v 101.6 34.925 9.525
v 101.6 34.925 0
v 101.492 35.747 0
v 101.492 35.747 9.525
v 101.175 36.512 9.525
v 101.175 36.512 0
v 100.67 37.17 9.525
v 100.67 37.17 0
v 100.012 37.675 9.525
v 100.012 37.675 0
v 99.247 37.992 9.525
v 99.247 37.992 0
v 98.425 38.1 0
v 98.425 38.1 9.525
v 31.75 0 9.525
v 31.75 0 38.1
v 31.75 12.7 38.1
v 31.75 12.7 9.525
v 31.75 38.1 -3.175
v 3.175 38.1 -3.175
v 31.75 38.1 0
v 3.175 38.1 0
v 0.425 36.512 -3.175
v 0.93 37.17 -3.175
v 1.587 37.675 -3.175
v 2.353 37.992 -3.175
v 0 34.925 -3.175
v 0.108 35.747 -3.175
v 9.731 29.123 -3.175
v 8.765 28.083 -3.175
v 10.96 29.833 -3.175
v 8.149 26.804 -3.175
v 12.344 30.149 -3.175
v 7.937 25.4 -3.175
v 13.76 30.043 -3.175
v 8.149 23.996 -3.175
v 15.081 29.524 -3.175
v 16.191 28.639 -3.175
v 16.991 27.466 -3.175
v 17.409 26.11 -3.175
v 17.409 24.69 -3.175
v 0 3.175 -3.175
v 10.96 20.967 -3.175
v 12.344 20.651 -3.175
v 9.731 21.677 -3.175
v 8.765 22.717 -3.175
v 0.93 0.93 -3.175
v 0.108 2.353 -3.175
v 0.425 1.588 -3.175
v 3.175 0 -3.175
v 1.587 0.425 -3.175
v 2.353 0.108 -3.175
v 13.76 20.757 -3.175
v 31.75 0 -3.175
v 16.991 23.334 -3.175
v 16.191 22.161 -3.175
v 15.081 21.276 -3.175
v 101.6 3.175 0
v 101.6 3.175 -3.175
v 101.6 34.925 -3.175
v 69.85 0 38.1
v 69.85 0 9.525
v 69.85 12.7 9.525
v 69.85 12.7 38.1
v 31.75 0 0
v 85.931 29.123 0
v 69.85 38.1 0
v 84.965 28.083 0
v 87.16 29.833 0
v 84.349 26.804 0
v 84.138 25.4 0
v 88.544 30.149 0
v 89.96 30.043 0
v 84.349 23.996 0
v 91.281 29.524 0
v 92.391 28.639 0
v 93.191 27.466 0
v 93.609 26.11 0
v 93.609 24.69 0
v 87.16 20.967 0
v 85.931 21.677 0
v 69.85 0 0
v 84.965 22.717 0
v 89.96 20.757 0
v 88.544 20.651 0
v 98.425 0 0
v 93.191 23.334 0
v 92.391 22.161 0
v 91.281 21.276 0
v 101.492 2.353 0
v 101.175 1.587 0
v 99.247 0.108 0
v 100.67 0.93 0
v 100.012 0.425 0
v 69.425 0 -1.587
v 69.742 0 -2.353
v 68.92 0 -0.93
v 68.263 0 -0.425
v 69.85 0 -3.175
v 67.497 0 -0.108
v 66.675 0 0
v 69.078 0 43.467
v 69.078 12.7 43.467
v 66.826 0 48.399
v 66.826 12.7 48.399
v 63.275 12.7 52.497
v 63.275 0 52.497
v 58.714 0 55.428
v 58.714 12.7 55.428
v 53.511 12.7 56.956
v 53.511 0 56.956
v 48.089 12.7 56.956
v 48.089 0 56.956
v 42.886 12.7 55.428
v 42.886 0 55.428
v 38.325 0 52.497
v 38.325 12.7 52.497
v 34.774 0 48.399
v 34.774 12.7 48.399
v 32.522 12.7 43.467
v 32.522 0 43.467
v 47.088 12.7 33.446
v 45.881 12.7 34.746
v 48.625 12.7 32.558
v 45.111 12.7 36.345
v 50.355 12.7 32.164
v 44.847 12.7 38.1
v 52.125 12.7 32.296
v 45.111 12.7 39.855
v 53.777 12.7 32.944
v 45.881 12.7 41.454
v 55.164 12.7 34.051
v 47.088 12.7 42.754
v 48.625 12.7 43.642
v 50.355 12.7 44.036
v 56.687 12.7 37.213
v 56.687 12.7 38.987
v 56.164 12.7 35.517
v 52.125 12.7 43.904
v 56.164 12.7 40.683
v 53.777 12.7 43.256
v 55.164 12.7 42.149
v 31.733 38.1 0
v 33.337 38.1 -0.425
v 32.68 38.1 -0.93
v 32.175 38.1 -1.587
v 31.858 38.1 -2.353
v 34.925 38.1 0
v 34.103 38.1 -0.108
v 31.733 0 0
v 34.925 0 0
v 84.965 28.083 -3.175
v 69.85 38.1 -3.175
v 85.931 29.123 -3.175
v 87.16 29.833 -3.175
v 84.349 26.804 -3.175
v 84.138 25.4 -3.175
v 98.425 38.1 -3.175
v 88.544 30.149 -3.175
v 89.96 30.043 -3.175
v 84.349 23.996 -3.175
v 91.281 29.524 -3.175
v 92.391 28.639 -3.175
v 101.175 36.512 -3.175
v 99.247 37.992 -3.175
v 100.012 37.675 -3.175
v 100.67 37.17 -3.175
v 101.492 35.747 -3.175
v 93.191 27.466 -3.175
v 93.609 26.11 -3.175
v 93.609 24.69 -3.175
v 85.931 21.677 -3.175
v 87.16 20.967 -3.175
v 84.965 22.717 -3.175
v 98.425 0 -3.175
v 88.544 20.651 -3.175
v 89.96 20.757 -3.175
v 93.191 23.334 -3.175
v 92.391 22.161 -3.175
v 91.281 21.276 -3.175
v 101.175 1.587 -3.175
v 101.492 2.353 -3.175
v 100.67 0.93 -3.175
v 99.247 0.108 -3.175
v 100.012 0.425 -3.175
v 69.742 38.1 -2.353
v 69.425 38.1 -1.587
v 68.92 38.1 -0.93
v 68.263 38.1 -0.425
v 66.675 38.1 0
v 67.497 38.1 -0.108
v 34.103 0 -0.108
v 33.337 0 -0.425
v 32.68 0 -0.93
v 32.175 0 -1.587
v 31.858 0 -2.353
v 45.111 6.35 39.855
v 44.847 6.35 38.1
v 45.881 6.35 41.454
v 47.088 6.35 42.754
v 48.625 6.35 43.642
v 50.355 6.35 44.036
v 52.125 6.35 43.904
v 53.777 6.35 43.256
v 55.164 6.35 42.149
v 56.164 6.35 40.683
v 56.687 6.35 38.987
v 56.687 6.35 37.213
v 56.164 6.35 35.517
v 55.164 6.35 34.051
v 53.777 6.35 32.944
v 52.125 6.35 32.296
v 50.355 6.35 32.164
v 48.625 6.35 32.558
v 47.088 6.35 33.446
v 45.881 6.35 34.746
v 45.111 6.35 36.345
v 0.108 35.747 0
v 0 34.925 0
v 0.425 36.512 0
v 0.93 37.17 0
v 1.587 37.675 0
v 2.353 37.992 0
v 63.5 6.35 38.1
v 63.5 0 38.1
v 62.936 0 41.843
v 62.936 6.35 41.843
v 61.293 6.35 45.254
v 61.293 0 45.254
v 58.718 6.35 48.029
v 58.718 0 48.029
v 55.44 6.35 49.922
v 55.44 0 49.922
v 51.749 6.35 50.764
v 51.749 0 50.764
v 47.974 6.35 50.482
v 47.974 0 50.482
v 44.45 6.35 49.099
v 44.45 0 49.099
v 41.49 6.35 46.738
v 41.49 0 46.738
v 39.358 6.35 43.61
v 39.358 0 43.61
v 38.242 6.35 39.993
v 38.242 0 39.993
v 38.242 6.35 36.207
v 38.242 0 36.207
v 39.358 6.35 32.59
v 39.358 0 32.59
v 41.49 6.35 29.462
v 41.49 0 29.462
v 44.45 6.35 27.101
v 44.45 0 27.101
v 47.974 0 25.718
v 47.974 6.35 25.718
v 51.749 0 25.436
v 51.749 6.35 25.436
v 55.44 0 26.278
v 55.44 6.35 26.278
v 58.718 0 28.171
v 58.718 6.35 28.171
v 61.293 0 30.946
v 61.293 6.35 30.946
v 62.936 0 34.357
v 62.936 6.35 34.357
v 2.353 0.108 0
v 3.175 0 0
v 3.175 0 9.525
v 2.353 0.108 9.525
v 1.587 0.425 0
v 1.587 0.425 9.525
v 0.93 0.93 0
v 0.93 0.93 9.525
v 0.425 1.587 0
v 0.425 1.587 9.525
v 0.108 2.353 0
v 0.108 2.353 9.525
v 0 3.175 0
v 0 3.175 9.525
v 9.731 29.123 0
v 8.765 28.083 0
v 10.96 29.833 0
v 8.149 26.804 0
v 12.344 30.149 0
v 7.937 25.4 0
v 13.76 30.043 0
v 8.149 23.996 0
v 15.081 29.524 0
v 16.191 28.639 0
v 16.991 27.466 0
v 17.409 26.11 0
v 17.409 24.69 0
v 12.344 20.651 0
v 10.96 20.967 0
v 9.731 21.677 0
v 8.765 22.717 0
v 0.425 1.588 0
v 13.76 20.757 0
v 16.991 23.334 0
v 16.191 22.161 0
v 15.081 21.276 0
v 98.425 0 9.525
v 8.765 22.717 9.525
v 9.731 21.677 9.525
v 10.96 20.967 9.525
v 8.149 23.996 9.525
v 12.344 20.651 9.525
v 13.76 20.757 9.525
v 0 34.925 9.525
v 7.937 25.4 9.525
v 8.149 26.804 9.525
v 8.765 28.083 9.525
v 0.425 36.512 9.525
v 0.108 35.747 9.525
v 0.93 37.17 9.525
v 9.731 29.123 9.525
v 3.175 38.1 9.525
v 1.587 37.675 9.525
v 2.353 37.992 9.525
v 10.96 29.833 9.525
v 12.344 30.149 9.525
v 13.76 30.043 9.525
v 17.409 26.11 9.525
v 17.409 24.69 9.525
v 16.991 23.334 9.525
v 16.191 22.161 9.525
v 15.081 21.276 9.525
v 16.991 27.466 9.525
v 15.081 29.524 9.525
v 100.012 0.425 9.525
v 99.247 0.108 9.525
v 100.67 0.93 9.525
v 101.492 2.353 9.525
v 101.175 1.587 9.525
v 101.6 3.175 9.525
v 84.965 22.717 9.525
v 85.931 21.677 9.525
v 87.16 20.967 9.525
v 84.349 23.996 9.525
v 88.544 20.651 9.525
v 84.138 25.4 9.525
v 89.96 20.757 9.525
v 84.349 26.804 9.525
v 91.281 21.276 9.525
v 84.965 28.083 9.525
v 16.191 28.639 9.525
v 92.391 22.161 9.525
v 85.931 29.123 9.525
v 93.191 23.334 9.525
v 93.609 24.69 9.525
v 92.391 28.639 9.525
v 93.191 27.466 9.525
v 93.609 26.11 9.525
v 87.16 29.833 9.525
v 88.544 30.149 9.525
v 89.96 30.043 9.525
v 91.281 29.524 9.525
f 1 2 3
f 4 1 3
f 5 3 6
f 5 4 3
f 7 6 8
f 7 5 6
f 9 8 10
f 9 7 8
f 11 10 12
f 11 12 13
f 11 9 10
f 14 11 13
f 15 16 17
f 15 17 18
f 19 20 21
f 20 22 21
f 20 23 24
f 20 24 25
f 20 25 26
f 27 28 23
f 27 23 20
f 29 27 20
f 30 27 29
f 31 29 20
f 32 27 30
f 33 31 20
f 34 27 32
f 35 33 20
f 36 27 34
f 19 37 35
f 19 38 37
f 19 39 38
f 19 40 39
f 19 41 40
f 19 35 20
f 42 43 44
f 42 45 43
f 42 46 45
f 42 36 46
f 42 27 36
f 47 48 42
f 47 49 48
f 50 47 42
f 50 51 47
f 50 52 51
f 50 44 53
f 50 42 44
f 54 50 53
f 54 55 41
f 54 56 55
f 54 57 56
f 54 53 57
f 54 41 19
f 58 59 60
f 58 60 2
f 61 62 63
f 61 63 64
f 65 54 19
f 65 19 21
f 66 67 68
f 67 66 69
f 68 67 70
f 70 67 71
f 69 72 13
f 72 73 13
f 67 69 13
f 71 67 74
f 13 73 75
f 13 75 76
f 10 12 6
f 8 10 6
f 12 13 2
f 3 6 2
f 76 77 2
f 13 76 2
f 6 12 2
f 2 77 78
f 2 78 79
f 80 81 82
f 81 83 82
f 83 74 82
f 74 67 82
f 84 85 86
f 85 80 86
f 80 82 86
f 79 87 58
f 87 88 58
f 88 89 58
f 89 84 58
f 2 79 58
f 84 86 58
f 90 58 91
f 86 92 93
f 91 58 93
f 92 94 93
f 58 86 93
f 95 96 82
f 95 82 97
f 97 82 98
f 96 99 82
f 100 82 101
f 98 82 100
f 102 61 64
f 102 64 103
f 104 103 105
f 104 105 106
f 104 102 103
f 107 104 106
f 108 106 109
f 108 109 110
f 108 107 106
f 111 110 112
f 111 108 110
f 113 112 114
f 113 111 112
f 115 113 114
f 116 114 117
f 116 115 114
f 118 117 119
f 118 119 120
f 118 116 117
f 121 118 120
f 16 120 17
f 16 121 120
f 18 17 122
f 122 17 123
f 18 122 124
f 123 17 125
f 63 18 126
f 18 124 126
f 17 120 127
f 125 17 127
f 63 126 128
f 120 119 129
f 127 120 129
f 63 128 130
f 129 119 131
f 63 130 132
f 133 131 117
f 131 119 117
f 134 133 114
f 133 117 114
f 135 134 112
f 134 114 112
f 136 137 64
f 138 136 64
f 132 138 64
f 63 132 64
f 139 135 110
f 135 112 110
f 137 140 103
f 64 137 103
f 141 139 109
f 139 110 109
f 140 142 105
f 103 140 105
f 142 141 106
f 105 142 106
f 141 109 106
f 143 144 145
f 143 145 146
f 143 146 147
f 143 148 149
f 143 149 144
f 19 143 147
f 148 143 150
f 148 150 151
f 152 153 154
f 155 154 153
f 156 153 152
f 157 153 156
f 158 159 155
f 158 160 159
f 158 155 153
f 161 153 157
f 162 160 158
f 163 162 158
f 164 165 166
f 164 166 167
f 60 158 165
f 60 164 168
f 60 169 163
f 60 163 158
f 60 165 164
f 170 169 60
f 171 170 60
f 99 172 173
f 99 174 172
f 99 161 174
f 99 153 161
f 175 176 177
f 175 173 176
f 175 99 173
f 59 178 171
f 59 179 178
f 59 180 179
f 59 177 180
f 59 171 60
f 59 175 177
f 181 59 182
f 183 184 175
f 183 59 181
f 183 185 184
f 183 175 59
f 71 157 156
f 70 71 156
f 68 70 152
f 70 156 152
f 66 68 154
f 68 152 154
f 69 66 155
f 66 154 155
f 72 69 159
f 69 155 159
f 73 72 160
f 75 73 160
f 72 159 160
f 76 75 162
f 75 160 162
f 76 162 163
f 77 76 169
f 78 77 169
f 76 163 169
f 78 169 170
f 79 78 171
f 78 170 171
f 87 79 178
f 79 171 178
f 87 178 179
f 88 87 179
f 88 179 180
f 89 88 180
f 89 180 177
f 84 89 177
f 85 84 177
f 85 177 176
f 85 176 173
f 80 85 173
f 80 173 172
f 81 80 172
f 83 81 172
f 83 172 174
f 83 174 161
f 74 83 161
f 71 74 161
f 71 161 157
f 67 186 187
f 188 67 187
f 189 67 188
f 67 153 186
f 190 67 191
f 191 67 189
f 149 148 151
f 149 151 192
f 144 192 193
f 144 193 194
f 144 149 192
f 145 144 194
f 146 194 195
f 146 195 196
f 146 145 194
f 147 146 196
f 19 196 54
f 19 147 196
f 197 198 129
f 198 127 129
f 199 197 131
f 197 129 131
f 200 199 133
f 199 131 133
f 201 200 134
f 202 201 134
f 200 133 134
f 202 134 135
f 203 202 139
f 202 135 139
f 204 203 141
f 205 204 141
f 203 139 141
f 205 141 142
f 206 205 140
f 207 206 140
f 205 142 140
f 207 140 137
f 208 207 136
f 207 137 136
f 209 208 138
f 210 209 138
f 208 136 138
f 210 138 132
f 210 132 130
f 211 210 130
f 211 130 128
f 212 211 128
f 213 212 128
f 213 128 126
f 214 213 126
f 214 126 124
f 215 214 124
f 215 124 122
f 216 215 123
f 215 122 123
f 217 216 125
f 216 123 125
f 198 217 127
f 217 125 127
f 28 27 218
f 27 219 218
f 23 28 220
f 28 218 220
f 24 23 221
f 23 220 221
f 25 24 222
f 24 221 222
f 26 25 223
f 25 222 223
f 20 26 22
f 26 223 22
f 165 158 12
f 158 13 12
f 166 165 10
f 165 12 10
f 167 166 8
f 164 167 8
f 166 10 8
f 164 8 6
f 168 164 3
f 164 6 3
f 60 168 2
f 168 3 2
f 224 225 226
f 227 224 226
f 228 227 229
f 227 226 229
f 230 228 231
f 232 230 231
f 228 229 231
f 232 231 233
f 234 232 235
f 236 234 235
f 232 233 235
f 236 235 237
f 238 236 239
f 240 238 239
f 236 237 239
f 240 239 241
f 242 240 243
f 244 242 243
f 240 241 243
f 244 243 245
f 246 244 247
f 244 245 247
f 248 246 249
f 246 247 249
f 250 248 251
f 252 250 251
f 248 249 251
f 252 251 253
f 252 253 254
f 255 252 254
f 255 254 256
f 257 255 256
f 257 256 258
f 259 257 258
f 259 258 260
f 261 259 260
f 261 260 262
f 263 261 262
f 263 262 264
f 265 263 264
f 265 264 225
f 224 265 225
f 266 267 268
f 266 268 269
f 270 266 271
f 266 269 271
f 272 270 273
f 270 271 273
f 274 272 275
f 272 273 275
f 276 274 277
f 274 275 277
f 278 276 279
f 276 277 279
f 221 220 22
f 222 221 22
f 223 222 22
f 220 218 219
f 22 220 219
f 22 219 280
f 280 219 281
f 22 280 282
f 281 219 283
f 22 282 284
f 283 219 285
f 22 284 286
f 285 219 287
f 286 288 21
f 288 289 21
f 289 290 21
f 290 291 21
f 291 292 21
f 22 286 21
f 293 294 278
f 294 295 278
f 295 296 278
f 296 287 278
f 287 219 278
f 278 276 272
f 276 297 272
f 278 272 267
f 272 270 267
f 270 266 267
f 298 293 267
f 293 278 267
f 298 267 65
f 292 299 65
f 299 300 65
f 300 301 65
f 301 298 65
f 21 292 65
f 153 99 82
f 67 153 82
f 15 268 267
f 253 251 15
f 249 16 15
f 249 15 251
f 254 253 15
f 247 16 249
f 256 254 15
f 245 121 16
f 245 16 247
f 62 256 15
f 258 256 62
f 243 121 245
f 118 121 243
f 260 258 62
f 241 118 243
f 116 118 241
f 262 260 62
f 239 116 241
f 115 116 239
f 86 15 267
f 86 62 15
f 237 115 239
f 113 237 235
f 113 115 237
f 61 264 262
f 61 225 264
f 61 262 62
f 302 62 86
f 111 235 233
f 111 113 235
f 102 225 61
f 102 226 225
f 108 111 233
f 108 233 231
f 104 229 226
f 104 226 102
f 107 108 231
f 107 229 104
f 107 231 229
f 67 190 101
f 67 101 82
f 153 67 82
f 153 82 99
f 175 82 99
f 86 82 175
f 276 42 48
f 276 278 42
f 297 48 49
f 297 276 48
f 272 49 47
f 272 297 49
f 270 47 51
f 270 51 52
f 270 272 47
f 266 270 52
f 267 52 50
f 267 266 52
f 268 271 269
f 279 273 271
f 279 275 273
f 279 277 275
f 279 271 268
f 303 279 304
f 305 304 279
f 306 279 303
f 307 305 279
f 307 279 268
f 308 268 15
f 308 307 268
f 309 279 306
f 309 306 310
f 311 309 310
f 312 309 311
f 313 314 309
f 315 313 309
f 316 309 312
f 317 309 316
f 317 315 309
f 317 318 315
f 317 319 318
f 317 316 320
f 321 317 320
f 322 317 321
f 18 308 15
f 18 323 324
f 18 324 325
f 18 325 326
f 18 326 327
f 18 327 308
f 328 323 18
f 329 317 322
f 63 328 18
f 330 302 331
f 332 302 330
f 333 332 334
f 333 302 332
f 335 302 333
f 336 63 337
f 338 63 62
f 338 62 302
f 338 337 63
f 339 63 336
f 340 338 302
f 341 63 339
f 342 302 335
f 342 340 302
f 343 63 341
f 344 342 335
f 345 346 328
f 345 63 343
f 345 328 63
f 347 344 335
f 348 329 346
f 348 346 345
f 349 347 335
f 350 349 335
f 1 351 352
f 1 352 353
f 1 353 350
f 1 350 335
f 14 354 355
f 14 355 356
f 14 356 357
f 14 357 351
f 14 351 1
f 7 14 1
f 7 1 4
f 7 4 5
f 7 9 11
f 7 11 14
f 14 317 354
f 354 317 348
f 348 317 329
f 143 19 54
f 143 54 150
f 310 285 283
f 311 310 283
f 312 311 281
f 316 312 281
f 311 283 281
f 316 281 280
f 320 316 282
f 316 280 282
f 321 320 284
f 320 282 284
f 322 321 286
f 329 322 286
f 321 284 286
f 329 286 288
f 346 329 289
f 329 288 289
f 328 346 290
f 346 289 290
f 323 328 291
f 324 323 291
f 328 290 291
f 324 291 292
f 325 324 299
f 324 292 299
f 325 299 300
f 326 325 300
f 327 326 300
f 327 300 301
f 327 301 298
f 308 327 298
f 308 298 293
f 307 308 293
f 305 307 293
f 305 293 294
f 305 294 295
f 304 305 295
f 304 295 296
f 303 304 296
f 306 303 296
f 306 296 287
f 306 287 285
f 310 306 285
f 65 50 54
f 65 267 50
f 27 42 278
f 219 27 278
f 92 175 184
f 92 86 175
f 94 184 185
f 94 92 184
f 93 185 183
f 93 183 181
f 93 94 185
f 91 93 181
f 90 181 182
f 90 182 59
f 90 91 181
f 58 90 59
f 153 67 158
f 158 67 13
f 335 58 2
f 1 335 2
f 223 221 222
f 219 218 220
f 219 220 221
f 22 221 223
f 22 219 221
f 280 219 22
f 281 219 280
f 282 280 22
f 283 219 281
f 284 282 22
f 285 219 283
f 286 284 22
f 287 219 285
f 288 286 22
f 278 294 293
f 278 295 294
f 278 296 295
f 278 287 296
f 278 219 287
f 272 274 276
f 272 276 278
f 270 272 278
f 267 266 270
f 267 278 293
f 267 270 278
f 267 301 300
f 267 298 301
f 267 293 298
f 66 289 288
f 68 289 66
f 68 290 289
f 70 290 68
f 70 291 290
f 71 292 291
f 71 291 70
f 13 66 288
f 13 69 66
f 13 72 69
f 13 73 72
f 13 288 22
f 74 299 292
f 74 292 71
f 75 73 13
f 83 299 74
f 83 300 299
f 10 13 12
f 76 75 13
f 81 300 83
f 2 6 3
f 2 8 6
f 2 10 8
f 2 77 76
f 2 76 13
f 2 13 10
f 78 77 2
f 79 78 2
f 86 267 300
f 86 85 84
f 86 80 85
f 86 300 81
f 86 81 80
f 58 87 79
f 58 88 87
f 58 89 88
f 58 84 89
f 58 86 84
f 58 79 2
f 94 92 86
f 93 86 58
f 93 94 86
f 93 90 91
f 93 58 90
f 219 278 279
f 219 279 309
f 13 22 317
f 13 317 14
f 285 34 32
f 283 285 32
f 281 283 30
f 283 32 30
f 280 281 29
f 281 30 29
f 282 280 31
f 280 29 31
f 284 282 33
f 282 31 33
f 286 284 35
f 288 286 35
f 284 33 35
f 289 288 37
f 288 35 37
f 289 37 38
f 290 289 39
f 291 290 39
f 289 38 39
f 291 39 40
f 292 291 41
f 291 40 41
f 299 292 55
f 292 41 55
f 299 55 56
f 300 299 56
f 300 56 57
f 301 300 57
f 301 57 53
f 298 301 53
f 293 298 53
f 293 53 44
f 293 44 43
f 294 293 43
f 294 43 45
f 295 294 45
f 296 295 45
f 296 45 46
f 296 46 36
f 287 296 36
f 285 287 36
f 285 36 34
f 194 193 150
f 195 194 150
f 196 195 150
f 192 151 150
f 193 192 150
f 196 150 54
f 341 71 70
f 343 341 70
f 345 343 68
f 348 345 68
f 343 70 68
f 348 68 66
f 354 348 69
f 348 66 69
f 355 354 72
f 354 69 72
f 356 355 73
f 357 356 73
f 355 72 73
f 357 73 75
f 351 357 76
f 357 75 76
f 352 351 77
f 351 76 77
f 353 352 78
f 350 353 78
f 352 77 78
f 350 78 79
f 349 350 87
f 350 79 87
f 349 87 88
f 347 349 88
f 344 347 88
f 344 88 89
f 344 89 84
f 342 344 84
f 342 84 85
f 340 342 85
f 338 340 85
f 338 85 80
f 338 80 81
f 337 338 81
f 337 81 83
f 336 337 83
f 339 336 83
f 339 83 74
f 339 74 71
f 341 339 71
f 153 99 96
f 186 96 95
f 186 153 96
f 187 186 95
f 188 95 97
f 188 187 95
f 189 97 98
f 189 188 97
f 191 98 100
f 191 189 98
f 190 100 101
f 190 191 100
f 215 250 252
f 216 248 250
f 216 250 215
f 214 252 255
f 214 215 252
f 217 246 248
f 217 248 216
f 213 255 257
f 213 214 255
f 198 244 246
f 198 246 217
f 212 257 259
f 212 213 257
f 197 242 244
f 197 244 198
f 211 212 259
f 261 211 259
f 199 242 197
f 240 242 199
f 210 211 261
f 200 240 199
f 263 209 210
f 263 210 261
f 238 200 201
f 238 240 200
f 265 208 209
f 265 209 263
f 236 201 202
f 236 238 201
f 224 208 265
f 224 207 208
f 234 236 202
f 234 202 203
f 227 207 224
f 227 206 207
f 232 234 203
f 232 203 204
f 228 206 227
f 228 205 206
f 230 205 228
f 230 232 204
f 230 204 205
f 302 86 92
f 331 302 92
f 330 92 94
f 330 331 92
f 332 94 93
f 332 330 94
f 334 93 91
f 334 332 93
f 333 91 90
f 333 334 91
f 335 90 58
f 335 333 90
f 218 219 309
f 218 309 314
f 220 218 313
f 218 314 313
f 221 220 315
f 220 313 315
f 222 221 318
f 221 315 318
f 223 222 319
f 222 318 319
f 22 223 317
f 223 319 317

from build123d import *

# Parameters (mm, degrees)
F0_W           = 101.6
F0_H           = 38.1
F1_DEPTH       = 9.525
F3_DEPTH       = 12.7
F5_D           = 11.90625
F5_CBORE_D     = 25.4
F5_CBORE_DEPTH = 6.35
F7_W           = 31.75
F7_H           = 3.175
F8_DEPTH       = 38.1
F10_D          = 9.525
F10_2_D        = 9.525
F10_3_D        = 9.525
F11_R          = 3.175
F11_2_R        = 3.175
F11_3_R        = 3.175
F13_DEPTH      = 38.1


# Not quite as in the source:
# - a length typed as a fraction of an inch, garbled in the dataset ("3 / 203.2 mm" for 3/8 in), is restored


with BuildPart() as f1:
    # F0 (on Top) → F1 (new body)
    with BuildSketch(Plane.XY):
        with Locations((50.8, 19.05)):
            Rectangle(F0_W, F0_H)
    extrude(amount=F1_DEPTH)

    # F2 (on face) → F3 (join)
    with BuildSketch(Plane.XZ):
        with BuildLine():
            Line((31.75, 38.1), (31.75, 0))
            Line((31.75, 0), (69.85, 0))
            Line((69.85, 0), (69.85, 38.1))
            ThreePointArc((69.85, 38.1), (50.8, 57.15), (31.75, 38.1))
        make_face()
    extrude(amount=-F3_DEPTH)

    # F5 (through all)
    with Locations(Plane.XZ):
        with Locations((50.8, 38.1)):
            CounterBoreHole(F5_D / 2, F5_CBORE_D / 2, F5_CBORE_DEPTH)

    # F10 (through all)
    with Locations(Plane.XY.offset(9.525)):
        with Locations((12.7, 25.4), (88.9, 25.4)):
            Hole(F10_D / 2)

    # F11
    f11_edges = [f1.edges().sort_by_distance(p)[0] for p in [
        (0, 0, 4.7625),
        (0, 38.1, 4.7625),
        (101.6, 0, 4.7625),
        (101.6, 38.1, 4.7625),
    ]]
    fillet(f11_edges, radius=F11_R)


with BuildPart() as f8:
    # F7 (on face) → F8 (new body, through all)
    with BuildSketch(Plane.XZ):
        with Locations((15.875, -1.5875)):
            Rectangle(F7_W, F7_H)
    extrude(amount=-F8_DEPTH)

    # F10#2 (through all)
    with Locations(Plane.XY.offset(9.525)):
        with Locations((12.7, 25.4), (88.9, 25.4)):
            Hole(F10_2_D / 2)

    # F11#2
    f11_2_edges = [f8.edges().sort_by_distance(p)[0] for p in [
        (0, 0, -1.5875),
        (0, 38.1, -1.5875),
    ]]
    fillet(f11_2_edges, radius=F11_2_R)


with BuildPart() as f8b:
    # F7 (on face) → F8, piece 2 (new body, through all)
    with BuildSketch(Plane.XZ):
        with Locations((85.725, -1.5875)):
            Rectangle(F7_W, F7_H)
    extrude(amount=-F8_DEPTH)

    # F10#3 (through all)
    with Locations(Plane.XY.offset(9.525)):
        with Locations((12.7, 25.4), (88.9, 25.4)):
            Hole(F10_3_D / 2)

    # F11#3
    f11_3_edges = [f8b.edges().sort_by_distance(p)[0] for p in [
        (101.6, 0, -1.5875),
        (101.6, 38.1, -1.5875),
    ]]
    fillet(f11_3_edges, radius=F11_3_R)


with BuildPart() as f13:
    # F12 (on face) → F13 (new body, through all)
    with BuildSketch(Plane(origin=(0, 38.1, 0), x_dir=(-1, 0, 0), z_dir=(0, 1, 0))):
        with BuildLine():
            Line((-31.7329987884, 0), (-34.925, 0))
            ThreePointArc((-34.925, 0), (-32.6799359697, -0.9299359697), (-31.75, -3.175))
            Line((-31.75, -3.175), (-31.7329987884, 0))
        make_face()
    extrude(amount=-F13_DEPTH)


with BuildPart() as f13b:
    # F12 (on face) → F13, piece 2 (new body, through all)
    with BuildSketch(Plane(origin=(0, 38.1, 0), x_dir=(-1, 0, 0), z_dir=(0, 1, 0))):
        with BuildLine():
            Line((-69.85, 0), (-69.85, -3.175))
            ThreePointArc((-69.85, -3.175), (-68.9200640303, -0.9299359697), (-66.675, 0))
            Line((-66.675, 0), (-69.85, 0))
        make_face()
    extrude(amount=-F13_DEPTH)


solid = Compound([f1.part, f8.part, f8b.part, f13.part, f13b.part])
